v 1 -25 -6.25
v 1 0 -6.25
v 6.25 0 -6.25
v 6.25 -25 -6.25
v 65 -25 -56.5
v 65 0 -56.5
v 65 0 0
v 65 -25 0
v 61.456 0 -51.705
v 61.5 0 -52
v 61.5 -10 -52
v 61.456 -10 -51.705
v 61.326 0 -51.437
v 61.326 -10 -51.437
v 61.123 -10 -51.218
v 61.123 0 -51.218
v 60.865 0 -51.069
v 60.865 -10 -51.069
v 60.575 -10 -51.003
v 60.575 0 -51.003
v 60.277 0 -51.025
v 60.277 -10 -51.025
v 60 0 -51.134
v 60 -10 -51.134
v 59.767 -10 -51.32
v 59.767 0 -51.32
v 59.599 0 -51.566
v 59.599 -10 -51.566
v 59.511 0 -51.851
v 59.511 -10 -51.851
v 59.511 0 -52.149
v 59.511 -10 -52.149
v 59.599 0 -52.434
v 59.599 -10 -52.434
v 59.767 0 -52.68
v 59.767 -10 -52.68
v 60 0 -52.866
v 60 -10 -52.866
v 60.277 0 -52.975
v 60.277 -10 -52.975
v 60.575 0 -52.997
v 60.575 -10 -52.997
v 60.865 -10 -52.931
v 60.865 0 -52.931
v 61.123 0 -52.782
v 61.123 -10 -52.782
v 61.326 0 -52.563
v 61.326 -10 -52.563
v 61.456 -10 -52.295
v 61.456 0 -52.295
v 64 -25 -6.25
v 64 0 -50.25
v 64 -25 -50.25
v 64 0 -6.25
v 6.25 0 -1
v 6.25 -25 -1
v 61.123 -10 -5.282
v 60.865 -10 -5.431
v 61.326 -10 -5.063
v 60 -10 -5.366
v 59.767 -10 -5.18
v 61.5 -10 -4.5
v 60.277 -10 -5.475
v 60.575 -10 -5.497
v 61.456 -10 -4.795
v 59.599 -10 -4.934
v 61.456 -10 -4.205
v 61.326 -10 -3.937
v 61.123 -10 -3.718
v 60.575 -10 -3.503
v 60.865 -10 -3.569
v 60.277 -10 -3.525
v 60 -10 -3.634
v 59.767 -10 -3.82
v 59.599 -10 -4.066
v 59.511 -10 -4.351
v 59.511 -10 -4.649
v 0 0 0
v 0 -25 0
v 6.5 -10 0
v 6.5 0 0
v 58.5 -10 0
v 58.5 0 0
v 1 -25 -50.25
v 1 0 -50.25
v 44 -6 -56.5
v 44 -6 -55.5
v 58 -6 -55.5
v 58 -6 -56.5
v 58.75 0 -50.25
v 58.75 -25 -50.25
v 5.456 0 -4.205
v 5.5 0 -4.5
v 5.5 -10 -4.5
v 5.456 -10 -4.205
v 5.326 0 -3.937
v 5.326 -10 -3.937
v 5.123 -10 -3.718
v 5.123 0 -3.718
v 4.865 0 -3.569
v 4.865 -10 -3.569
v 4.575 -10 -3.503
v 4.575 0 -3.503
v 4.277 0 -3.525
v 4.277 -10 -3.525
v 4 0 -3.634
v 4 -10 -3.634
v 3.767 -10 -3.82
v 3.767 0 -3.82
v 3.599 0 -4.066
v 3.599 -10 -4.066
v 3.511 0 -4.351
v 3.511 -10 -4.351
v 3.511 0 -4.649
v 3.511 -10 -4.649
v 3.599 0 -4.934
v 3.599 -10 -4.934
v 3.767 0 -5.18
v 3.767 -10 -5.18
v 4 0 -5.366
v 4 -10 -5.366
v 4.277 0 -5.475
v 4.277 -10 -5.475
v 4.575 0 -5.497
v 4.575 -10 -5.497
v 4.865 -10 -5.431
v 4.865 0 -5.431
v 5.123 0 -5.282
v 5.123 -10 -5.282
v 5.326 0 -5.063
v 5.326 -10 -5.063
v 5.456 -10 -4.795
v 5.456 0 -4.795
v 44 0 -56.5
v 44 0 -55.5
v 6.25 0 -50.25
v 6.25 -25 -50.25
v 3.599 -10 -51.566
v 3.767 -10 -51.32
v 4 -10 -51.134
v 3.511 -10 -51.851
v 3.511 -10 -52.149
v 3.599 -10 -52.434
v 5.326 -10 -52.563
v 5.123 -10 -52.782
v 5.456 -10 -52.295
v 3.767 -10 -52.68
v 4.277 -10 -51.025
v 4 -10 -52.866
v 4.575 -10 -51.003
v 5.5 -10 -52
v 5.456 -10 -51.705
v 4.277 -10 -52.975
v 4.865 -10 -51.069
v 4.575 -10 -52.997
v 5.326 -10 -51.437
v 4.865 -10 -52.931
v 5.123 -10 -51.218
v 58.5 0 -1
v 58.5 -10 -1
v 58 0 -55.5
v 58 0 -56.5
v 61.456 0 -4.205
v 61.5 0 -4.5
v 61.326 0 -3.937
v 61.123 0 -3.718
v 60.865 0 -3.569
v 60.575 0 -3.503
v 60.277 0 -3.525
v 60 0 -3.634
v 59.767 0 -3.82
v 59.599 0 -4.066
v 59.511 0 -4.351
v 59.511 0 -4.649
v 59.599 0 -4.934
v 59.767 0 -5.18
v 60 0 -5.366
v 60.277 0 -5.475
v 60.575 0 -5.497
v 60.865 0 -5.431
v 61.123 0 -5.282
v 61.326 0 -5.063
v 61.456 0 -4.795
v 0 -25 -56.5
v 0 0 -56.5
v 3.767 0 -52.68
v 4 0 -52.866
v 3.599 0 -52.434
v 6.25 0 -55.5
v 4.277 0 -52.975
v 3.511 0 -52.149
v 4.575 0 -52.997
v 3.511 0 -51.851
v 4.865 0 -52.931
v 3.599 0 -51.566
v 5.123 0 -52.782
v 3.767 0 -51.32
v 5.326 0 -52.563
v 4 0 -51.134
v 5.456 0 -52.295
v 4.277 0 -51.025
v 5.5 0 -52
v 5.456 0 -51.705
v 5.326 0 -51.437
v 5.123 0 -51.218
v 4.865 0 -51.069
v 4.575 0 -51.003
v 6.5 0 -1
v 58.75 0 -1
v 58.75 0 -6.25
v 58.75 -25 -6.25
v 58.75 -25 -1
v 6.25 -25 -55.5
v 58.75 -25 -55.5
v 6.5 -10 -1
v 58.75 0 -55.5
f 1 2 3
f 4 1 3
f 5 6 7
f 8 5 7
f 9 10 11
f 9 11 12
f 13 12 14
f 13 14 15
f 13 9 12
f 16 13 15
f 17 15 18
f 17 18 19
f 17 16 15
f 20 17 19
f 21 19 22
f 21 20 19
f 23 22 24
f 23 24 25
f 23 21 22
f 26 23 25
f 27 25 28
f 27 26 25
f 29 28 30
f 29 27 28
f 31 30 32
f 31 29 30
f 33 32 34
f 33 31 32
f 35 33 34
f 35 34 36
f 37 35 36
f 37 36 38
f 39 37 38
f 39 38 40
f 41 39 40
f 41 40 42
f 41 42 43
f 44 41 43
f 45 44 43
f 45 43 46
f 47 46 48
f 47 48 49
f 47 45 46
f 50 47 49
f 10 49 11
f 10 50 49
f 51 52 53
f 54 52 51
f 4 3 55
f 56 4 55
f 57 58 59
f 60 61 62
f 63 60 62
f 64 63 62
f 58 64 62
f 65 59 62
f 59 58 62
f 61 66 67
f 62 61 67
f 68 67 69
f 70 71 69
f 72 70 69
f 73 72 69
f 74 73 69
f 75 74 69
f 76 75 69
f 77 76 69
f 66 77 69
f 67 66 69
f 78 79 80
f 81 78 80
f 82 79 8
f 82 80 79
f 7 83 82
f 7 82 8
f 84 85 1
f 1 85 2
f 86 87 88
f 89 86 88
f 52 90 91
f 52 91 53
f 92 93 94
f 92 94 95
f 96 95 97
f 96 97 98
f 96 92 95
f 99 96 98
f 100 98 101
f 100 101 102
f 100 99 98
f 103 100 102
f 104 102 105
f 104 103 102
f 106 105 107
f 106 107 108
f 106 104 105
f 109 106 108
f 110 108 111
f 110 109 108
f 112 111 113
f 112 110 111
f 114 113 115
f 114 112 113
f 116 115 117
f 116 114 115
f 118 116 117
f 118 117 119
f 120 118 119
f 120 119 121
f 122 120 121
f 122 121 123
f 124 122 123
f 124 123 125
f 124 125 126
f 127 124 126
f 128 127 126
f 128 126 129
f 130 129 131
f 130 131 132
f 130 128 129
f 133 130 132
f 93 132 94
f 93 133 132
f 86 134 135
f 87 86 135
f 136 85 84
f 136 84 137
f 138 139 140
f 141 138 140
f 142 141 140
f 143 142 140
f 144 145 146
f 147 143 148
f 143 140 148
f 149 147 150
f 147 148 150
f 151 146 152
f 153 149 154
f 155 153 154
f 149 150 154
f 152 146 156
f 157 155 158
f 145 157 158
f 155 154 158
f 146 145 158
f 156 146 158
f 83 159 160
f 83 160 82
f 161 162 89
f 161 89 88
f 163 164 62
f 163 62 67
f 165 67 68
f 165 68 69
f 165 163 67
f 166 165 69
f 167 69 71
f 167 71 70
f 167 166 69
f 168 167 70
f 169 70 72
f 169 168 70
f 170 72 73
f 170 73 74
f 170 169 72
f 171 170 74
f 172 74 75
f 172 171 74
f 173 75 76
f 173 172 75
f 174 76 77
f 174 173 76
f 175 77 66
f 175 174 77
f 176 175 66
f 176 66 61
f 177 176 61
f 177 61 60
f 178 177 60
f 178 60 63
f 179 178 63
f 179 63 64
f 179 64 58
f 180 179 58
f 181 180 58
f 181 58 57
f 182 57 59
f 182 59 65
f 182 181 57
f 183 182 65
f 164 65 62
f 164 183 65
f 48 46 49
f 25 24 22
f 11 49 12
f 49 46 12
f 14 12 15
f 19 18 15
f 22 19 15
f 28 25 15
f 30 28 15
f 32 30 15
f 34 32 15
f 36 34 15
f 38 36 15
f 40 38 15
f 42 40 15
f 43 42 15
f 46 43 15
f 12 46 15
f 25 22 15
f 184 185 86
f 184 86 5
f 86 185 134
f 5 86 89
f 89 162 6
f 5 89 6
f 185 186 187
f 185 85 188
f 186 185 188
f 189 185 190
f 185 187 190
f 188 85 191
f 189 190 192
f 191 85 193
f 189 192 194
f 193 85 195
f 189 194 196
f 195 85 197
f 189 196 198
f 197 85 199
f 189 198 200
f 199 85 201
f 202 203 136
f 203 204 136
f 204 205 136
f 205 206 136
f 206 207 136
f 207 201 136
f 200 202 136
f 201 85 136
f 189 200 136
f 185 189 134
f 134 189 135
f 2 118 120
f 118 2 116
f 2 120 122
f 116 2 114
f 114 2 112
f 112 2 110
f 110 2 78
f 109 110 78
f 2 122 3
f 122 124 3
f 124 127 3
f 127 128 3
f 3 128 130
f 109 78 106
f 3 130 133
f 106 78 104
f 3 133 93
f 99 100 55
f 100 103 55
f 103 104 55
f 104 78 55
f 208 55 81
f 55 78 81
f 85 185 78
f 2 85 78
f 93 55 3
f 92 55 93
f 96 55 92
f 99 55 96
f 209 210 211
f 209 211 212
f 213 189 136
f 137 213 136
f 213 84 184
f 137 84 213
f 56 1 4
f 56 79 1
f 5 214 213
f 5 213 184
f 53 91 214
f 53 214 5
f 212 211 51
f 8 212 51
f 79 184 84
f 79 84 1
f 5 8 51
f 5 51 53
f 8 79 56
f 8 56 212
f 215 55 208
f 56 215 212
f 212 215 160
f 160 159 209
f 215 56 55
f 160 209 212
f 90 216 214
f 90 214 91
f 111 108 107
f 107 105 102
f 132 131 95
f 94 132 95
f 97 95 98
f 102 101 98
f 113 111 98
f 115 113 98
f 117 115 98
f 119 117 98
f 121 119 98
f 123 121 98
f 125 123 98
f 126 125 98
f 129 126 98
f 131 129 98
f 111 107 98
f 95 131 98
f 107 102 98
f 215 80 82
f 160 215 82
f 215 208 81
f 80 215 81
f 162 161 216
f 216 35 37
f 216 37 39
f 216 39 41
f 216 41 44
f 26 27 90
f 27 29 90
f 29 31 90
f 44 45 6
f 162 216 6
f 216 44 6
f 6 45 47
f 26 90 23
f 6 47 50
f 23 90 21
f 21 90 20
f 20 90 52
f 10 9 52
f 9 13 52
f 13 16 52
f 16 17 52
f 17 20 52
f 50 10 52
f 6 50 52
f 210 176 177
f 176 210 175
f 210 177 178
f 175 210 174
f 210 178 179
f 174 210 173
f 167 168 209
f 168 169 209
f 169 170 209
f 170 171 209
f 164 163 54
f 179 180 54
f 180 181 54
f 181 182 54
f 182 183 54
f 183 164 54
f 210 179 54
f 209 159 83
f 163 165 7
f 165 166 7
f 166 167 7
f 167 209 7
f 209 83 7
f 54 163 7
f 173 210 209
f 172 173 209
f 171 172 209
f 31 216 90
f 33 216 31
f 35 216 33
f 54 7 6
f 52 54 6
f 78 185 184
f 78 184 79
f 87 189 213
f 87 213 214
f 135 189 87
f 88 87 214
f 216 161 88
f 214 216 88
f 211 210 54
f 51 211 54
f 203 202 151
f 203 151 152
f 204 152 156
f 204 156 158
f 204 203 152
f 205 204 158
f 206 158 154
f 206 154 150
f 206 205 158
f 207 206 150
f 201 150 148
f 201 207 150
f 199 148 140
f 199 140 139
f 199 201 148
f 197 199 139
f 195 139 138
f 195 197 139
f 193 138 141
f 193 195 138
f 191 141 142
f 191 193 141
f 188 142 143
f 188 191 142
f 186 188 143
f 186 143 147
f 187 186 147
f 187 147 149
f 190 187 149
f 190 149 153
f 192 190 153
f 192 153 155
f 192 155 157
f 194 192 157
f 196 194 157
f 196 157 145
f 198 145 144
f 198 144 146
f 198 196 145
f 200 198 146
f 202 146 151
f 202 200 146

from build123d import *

# Parameters (mm, degrees)
SKETCH_W        = 65
SKETCH_H        = 56.5
SKETCH_W_2      = 63
SKETCH_H_2      = 54.5
PAD_DEPTH       = 25
SKETCH001_W     = 52
SKETCH001_H     = 1
POCKET_DEPTH    = 10
SKETCH002_W     = 14
SKETCH002_H     = 1
POCKET001_DEPTH = 6
SKETCH003_W     = 6.25
SKETCH003_H     = 6.25
PAD001_DEPTH    = 25
SKETCH004_R     = 1
POCKET002_DEPTH = 10


with BuildPart() as part:
    # Sketch → Pad (new body)
    with BuildSketch(Plane.XZ):
        with Locations((32.5, -28.25)):
            Rectangle(SKETCH_W, SKETCH_H)
        with Locations((32.5, -28.25)):
            Rectangle(SKETCH_W_2, SKETCH_H_2, mode=Mode.SUBTRACT)
    extrude(amount=PAD_DEPTH)

    # Sketch001 → Pocket (cut)
    with BuildSketch(Plane.XZ):
        with Locations((32.5, -0.5)):
            Rectangle(SKETCH001_W, SKETCH001_H)
    extrude(amount=POCKET_DEPTH, mode=Mode.SUBTRACT)

    # Sketch002 → Pocket001 (cut)
    with BuildSketch(Plane.XZ):
        with Locations((51, -56)):
            Rectangle(SKETCH002_W, SKETCH002_H)
    extrude(amount=POCKET001_DEPTH, mode=Mode.SUBTRACT)

    # Sketch003 → Pad001 (join)
    with BuildSketch(Plane.XZ):
        with Locations((3.125, -3.125)):
            Rectangle(SKETCH003_W, SKETCH003_H)
        with Locations((3.125, -53.375)):
            Rectangle(SKETCH003_W, SKETCH003_H)
        with Locations((61.875, -53.375)):
            Rectangle(SKETCH003_W, SKETCH003_H)
        with Locations((61.875, -3.125)):
            Rectangle(SKETCH003_W, SKETCH003_H)
    extrude(amount=PAD001_DEPTH)

    # Sketch004 → Pocket002 (cut)
    with BuildSketch(Plane.XZ):
        with Locations((4.5, -52)):
            Circle(SKETCH004_R)
        with Locations((4.5, -4.5)):
            Circle(SKETCH004_R)
        with Locations((60.5, -4.5)):
            Circle(SKETCH004_R)
        with Locations((60.5, -52)):
            Circle(SKETCH004_R)
    extrude(amount=POCKET002_DEPTH, mode=Mode.SUBTRACT)


solid = part.part
